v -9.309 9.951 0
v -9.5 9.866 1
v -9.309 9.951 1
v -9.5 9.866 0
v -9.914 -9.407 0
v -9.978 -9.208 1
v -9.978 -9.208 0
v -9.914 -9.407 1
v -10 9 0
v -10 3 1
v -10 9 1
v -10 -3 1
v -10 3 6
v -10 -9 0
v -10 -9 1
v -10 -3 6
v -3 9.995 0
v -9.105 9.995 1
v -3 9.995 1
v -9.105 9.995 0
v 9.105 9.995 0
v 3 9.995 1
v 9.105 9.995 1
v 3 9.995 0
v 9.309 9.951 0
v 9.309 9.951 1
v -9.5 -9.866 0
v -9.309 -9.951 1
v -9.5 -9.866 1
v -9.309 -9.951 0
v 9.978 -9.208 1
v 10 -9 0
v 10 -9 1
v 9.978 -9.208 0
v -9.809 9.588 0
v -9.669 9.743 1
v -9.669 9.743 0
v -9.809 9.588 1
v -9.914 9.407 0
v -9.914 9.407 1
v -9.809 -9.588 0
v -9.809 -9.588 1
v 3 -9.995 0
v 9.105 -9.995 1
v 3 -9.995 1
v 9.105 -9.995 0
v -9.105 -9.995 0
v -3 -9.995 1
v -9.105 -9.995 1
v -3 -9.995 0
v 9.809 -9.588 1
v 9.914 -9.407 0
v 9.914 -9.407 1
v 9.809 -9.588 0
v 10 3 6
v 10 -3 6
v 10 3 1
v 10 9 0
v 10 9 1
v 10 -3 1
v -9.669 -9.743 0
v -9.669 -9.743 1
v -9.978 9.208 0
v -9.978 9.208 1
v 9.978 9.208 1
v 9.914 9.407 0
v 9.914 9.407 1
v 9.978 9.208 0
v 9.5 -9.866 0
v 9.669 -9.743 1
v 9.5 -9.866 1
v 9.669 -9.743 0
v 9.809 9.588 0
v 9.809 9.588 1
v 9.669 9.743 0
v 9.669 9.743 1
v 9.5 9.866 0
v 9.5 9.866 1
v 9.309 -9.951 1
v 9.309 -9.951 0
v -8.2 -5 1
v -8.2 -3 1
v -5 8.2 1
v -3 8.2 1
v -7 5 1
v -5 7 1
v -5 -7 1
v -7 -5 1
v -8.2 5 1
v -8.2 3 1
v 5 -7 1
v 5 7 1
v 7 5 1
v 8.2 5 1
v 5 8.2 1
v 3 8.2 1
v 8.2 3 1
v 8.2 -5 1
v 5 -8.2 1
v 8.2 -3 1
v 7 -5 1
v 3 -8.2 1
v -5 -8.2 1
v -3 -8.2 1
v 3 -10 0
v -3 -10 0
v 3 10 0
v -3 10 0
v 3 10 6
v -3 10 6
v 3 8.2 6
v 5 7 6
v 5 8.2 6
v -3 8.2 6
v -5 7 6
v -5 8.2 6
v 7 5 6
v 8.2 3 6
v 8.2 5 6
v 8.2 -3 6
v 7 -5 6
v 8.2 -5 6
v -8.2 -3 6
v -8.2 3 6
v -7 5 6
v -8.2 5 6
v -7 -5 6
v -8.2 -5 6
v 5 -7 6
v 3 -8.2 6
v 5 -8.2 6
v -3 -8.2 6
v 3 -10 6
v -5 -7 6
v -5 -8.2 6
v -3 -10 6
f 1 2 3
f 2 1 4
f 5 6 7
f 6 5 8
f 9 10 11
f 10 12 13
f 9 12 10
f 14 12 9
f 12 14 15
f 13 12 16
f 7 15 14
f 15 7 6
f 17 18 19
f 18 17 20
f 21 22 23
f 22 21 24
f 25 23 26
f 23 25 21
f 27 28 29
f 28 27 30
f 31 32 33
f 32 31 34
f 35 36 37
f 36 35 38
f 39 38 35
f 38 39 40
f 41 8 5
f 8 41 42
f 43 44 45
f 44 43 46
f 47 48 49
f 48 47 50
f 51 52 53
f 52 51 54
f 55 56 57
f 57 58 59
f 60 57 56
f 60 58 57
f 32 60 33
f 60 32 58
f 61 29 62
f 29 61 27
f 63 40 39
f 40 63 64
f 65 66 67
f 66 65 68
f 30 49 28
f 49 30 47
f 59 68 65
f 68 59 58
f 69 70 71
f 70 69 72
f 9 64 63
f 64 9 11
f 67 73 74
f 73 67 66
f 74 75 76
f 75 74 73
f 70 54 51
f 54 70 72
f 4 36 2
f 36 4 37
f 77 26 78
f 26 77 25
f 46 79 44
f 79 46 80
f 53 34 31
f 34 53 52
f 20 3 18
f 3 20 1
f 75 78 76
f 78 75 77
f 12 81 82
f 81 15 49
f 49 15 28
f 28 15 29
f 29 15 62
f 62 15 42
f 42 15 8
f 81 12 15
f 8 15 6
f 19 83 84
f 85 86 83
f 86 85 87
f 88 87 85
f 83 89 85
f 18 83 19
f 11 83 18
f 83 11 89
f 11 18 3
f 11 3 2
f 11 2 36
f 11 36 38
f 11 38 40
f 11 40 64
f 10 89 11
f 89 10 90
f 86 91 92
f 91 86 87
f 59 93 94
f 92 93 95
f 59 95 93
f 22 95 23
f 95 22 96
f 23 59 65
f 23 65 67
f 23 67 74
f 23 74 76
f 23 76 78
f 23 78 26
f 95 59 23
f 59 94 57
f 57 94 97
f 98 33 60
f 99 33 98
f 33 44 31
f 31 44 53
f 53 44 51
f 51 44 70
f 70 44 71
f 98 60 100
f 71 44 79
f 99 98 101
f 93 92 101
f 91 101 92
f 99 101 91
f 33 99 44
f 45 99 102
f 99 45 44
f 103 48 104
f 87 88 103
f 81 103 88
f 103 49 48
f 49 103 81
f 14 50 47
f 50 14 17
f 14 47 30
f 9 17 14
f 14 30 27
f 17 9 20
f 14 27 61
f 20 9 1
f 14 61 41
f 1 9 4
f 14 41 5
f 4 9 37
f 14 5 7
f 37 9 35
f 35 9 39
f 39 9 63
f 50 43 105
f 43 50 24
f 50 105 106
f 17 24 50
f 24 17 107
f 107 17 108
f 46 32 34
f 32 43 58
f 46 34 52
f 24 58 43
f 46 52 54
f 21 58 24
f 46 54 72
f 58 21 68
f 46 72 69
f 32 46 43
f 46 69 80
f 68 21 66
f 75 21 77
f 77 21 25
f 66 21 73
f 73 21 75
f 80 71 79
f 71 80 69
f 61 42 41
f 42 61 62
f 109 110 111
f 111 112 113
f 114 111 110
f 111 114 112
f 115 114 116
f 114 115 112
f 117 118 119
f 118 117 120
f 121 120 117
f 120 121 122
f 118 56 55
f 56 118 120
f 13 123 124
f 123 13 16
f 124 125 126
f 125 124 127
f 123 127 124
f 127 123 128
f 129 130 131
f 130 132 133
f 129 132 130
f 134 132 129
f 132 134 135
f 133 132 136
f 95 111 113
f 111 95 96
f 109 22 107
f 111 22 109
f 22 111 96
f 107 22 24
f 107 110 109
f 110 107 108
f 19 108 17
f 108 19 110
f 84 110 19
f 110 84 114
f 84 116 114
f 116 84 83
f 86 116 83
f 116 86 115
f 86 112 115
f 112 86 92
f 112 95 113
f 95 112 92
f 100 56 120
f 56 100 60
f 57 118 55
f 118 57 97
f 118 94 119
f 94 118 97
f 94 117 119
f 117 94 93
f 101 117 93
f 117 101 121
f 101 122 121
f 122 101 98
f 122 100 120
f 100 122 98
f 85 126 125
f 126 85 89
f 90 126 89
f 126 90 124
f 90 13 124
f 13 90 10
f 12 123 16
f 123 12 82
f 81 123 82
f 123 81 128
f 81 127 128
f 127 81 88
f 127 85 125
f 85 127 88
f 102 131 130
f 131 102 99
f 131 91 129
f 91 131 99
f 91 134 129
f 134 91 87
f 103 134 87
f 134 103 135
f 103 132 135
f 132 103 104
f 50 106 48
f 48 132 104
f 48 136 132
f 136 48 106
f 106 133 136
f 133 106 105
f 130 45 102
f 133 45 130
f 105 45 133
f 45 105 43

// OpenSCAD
// End Cap for 2020 T-Slot Aluminum Extrusion
// Adrian McCarthy 2023-03-29

// Extrusion profiles vary in many ways.  Values were based on ones
// commonly seen in dimension diagrams online, and tweaked for the
// extrusion I had on hand to make a good friction fit.

module end_cap_2020(h=1, r=1, nozzle_d=0.4) {
    reach = 10 - r;
    linear_extrude(h) hull($fs=nozzle_d/2) {
        translate([-reach, -reach]) circle(r=r);
        translate([ reach, -reach]) circle(r=r);
        translate([ reach,  reach]) circle(r=r);
        translate([-reach,  reach]) circle(r=r);
    }
    
    a = 6/2;
    b = 16.4/2;
    c = 10/2;
    d = 14/2;
    t_profile = [
        [ 10,   a],
        [  b,   a],
        [  b,   c],
        [  d,   c],
        [  d,  -c],
        [  b,  -c],
        [  b,  -a],
        [ 10,  -a]
    ];
    linear_extrude(6) {
        for (theta = [0:90:270]) {
            rotate([0, 0, theta]) polygon(t_profile);
        }
    }
}

end_cap_2020();
